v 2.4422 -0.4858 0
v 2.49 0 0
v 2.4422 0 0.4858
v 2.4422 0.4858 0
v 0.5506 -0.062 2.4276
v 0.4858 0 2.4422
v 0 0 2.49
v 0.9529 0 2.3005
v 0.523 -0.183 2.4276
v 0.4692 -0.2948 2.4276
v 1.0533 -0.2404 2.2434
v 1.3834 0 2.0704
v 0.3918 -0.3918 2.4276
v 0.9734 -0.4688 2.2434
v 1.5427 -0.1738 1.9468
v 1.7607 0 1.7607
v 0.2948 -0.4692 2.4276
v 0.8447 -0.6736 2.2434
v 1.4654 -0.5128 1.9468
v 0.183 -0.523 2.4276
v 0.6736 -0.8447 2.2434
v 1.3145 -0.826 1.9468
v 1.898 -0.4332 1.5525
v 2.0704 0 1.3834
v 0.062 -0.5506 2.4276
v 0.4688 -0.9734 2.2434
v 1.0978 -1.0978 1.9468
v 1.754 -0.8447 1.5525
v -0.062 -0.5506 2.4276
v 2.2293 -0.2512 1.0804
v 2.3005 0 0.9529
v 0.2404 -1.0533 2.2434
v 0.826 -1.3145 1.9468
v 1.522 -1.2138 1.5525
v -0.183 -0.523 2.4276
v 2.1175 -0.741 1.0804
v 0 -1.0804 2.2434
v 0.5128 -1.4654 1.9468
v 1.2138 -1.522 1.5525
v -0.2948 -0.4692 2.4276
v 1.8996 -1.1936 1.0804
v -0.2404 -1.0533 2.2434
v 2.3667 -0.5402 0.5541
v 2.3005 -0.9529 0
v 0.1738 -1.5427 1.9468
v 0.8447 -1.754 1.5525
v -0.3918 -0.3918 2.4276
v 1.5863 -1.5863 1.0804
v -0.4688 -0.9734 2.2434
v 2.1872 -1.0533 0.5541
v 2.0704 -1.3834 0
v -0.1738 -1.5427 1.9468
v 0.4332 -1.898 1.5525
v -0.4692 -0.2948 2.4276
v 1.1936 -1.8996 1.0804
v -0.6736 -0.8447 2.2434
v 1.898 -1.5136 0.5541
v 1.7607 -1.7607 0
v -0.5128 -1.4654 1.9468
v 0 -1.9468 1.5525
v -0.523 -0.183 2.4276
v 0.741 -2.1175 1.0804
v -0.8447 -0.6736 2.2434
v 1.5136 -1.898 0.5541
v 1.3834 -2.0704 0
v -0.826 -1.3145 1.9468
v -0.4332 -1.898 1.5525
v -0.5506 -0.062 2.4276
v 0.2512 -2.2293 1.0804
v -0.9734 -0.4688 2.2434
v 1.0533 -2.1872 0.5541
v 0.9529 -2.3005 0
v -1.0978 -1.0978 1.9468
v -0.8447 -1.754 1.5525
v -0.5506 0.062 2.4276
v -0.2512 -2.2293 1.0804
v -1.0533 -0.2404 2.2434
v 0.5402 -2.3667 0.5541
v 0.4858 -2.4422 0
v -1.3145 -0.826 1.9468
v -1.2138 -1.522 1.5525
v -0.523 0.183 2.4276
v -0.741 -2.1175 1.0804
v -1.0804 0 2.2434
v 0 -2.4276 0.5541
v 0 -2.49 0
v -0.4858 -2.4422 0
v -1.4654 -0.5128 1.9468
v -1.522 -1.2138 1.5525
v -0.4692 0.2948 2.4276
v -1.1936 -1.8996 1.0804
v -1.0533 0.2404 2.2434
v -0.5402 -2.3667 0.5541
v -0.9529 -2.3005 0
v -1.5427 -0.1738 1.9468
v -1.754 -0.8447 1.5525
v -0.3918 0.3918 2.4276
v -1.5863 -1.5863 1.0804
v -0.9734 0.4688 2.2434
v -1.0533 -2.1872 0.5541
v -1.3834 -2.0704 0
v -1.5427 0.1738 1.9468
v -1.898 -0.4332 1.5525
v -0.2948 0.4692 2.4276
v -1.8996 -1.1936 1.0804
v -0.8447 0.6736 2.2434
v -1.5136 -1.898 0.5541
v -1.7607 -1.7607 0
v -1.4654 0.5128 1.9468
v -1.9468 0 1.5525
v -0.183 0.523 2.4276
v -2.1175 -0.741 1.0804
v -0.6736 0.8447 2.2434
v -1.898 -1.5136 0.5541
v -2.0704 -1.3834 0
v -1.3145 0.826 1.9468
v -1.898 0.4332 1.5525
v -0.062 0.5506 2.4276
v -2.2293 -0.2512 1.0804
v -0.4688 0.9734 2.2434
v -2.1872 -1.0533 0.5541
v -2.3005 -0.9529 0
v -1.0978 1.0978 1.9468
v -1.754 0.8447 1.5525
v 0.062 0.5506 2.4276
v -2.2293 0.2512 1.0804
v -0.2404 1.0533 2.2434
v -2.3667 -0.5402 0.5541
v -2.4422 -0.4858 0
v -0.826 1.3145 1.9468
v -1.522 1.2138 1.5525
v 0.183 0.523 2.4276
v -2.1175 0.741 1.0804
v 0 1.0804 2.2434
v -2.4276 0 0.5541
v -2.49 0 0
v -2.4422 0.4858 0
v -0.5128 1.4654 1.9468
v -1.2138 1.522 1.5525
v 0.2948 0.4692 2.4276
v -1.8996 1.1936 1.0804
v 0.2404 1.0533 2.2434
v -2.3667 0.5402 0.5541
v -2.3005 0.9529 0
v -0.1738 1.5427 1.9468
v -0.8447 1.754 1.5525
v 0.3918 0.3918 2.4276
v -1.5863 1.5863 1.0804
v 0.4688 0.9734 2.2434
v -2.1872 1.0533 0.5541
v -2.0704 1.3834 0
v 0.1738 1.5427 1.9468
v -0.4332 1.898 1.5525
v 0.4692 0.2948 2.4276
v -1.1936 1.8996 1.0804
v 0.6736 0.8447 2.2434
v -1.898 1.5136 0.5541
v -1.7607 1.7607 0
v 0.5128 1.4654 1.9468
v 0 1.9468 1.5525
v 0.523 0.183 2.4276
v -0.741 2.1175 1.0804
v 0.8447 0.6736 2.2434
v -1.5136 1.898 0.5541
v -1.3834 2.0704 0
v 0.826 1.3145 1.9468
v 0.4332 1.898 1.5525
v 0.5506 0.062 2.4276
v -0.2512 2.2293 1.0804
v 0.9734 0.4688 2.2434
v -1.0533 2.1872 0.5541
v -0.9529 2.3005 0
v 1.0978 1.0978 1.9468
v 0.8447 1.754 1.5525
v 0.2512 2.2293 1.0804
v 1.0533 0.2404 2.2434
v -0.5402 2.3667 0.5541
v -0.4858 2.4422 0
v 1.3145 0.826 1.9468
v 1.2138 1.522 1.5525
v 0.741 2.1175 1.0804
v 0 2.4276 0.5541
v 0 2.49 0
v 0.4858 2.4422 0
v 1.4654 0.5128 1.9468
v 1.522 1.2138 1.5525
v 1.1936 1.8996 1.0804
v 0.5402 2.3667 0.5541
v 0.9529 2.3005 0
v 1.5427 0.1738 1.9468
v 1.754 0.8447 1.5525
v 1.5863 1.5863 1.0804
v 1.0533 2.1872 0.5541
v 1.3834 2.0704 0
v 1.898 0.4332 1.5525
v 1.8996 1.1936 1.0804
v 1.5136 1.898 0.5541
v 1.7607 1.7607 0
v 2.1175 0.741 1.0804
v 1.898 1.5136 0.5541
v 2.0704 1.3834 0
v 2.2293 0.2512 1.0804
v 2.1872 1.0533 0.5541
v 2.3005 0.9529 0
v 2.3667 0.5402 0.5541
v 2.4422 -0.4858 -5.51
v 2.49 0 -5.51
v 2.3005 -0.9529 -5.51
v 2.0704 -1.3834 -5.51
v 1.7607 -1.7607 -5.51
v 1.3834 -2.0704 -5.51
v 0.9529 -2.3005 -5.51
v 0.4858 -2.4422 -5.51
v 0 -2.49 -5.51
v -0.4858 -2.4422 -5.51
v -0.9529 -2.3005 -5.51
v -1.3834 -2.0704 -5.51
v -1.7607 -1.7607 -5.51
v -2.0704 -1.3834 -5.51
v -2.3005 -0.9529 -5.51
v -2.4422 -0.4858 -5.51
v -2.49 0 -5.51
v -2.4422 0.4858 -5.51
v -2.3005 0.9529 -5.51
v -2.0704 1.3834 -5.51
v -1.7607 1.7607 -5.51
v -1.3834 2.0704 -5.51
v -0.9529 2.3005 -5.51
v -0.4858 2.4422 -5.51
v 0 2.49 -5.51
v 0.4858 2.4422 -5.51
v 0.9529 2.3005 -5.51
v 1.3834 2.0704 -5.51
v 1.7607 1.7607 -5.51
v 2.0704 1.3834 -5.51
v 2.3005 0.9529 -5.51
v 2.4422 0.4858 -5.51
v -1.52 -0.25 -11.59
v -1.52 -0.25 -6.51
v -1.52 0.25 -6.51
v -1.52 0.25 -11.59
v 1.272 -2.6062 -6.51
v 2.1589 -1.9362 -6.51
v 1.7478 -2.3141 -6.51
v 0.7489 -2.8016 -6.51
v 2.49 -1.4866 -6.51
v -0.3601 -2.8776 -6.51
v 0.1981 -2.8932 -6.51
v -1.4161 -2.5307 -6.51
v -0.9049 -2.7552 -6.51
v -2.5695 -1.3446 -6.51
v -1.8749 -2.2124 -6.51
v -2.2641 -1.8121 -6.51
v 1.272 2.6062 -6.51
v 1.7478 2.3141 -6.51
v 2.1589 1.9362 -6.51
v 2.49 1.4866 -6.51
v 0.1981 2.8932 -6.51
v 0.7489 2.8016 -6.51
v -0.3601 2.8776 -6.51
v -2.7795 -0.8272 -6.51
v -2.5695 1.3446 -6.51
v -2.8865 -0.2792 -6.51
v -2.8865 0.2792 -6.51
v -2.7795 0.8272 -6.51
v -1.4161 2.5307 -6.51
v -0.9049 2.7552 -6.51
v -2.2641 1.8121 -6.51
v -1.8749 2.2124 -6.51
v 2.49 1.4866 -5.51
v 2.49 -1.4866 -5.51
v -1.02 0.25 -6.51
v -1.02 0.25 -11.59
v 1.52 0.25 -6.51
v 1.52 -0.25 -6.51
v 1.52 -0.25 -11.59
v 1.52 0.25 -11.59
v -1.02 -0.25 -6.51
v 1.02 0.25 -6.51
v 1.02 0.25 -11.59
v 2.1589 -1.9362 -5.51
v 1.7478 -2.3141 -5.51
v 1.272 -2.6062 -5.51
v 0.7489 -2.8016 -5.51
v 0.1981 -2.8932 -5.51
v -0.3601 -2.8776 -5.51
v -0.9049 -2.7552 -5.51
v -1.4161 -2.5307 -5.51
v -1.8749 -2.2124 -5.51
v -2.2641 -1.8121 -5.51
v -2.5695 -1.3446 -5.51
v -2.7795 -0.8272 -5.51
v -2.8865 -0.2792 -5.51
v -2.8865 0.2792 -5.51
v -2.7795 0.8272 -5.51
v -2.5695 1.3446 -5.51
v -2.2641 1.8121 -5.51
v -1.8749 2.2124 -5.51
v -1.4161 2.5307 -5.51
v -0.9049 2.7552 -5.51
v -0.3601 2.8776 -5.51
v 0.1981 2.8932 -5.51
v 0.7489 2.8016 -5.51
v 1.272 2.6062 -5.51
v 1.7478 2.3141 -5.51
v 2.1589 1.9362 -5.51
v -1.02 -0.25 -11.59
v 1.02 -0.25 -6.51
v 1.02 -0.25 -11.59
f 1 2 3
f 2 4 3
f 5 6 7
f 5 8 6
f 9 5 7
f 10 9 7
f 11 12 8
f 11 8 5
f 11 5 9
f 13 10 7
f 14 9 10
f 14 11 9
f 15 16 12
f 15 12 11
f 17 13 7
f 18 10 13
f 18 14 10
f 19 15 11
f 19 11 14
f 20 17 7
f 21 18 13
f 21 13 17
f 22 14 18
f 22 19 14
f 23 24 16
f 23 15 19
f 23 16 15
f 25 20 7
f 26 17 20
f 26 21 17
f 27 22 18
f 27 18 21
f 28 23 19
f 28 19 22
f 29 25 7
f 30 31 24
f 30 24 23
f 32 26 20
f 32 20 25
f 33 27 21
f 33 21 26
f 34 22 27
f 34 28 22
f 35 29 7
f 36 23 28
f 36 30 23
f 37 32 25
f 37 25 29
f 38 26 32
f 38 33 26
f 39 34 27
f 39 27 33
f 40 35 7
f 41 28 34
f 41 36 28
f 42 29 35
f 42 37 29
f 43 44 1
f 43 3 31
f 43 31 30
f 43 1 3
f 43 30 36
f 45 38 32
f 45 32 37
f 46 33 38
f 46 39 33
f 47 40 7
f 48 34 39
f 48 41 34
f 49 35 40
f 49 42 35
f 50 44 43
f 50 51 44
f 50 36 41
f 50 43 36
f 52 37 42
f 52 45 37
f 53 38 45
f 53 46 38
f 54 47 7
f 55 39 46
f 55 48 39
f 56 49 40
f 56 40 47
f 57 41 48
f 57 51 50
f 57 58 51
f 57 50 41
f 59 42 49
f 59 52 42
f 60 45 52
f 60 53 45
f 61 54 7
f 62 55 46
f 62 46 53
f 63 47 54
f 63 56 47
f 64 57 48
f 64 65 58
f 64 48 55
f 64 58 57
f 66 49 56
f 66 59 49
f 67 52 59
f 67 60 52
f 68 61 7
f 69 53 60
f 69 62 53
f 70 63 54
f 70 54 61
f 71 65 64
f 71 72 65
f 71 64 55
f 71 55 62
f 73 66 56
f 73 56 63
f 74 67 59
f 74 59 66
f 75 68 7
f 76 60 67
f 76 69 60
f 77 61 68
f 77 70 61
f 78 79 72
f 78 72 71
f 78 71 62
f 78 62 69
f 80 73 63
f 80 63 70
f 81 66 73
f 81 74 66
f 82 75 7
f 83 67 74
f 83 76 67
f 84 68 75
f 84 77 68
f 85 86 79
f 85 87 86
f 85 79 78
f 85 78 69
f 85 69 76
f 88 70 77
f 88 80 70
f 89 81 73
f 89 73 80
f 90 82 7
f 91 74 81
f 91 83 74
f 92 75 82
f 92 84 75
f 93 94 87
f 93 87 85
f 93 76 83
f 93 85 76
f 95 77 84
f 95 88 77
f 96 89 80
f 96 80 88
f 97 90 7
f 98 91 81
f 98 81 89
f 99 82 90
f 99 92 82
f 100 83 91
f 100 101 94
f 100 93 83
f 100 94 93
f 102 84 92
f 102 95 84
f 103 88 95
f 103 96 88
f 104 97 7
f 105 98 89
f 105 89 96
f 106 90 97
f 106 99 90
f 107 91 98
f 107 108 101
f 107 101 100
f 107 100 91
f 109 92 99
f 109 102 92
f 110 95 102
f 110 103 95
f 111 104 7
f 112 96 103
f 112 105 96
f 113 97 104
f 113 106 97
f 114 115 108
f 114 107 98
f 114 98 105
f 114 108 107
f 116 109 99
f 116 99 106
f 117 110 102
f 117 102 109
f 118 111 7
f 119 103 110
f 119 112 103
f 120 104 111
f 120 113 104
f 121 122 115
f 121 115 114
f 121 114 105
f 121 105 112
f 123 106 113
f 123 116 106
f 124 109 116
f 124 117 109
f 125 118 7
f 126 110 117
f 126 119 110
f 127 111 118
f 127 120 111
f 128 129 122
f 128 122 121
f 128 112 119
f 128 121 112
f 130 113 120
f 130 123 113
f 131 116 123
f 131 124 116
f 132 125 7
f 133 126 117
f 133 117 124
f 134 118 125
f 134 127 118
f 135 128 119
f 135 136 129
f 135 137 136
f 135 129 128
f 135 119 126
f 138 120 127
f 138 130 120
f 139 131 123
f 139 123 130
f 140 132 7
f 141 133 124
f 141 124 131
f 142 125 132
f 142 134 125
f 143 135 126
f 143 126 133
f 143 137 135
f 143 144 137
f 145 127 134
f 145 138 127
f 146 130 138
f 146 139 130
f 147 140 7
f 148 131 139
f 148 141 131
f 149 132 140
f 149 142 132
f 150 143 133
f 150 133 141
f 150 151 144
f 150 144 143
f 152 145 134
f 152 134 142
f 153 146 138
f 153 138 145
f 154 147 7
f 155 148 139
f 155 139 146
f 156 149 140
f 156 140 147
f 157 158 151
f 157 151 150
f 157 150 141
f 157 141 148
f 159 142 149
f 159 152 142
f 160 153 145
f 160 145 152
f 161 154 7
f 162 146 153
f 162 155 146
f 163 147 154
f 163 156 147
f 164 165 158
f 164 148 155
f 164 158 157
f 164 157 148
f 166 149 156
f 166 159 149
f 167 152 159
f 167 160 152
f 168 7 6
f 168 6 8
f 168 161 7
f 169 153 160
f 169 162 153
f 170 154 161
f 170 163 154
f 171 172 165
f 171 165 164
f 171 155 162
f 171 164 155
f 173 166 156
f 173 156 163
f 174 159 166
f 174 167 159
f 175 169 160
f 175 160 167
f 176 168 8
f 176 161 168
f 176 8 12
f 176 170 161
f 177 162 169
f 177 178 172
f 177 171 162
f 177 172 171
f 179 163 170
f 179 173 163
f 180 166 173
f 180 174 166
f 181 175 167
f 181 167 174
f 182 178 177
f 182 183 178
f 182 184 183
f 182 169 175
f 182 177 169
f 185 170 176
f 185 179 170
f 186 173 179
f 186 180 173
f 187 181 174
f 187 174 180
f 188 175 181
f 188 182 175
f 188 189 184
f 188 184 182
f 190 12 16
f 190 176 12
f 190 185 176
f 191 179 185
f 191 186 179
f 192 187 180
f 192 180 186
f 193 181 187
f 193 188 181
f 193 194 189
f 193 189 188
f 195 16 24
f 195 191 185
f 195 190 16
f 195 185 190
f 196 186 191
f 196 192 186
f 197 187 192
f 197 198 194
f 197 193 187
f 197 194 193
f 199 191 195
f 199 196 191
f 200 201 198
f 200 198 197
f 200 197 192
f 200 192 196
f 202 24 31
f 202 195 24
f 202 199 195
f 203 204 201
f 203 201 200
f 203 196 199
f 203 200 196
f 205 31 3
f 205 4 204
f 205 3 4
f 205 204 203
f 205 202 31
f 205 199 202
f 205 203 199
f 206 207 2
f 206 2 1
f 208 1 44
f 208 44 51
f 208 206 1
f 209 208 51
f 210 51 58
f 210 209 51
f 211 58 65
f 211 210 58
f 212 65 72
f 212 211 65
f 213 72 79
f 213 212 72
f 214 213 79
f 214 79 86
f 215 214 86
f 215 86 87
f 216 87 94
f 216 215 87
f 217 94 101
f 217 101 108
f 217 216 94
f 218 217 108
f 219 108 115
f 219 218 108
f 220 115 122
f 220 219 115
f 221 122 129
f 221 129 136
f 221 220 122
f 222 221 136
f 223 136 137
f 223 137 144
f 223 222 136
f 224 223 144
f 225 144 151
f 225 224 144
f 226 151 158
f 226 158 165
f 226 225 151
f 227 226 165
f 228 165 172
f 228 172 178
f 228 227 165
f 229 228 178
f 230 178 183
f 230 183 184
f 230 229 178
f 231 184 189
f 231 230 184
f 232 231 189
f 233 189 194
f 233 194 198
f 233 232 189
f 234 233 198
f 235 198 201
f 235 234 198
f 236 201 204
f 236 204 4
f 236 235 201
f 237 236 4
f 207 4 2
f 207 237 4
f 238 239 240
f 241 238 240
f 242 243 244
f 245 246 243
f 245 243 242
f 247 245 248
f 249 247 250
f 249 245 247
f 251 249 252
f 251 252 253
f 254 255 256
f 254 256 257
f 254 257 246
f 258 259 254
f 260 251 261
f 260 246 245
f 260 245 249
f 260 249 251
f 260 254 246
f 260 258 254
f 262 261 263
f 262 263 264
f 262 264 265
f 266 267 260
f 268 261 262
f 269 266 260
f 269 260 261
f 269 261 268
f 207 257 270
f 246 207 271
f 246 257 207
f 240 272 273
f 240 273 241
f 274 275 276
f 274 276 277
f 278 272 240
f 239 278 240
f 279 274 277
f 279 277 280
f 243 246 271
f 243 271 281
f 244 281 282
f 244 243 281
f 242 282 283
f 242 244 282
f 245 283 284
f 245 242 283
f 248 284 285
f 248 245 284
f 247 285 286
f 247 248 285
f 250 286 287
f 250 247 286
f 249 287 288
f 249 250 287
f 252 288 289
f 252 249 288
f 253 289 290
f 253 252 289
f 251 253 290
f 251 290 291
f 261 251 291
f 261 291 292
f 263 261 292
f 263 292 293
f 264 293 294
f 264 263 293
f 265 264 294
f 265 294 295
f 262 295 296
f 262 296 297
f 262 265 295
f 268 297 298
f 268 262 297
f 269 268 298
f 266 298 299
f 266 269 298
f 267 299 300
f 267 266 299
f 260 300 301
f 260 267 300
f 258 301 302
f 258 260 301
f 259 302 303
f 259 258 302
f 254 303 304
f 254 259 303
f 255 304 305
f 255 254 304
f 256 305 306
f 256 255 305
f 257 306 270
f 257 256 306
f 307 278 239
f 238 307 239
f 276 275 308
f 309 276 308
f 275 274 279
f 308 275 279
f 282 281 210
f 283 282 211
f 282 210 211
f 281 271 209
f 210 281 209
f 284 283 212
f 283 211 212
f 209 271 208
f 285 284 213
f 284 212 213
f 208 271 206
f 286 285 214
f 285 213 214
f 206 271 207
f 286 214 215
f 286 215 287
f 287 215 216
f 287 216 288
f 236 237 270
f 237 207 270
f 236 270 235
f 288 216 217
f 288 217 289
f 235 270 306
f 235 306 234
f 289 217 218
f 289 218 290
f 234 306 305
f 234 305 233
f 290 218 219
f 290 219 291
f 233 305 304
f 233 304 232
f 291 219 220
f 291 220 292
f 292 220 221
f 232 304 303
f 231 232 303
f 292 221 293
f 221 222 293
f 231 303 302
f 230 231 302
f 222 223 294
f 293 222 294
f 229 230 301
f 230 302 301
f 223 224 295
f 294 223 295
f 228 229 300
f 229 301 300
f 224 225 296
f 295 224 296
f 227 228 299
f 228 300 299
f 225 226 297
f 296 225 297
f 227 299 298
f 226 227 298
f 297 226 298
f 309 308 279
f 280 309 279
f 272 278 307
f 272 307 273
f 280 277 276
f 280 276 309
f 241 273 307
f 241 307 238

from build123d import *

# Parameters (mm, degrees)
BOSS_EXTRUDE1_DEPTH   = 1
SKETCH3_W             = 0.5
SKETCH3_H             = 0.5
BOSS_EXTRUDE2_DEPTH   = 5.08
BOSS_EXTRUDE2_2_DEPTH = 5.08


with BuildPart() as part:
    # Sketch1 → Revolve1 (revolve)
    with BuildSketch(Plane(origin=(0, 0, 0), x_dir=(1, 0, 0), z_dir=(0, 1, 0)), mode=Mode.PRIVATE) as revolve1_sk:
        with BuildLine():
            Line((-2.49, 0), (-2.49, 6.51))
            Line((-2.49, 6.51), (0, 6.51))
            Line((0, 6.51), (0, -2.49))
            ThreePointArc((0, -2.49), (-1.760695885, -1.760695885), (-2.49, 0))
        make_face()
    revolve(revolve1_sk.sketch.rotate(Axis((0, 0, 2.49), (0, 0, -1)), 180), axis=Axis((0, 0, 2.49), (0, 0, -1)))  # turned: the seam where the file's is

    # Sketch2 → Boss-Extrude1 (add)
    with BuildSketch(Plane(origin=(0, 0, -6.51), x_dir=(-1, 0, 0), z_dir=(0, 0, -1))):
        with BuildLine():
            Line((-2.49, 1.486573241), (-2.49, -1.486573241))
            ThreePointArc((-2.49, -1.486573241), (2.9, 0), (-2.49, 1.486573241))
        make_face()
    extrude(amount=-BOSS_EXTRUDE1_DEPTH)


with BuildPart() as body_2:
    # Sketch3 → Boss-Extrude2 (new body)
    with BuildSketch(Plane(origin=(0, 0, -6.51), x_dir=(-1, 0, 0), z_dir=(0, 0, -1))):
        with Locations((-1.27, 0)):
            Rectangle(SKETCH3_W, SKETCH3_H)
    extrude(amount=BOSS_EXTRUDE2_DEPTH)


with BuildPart() as body_3:
    # Sketch3 → Boss-Extrude2 2 (new body)
    with BuildSketch(Plane(origin=(0, 0, -6.51), x_dir=(-1, 0, 0), z_dir=(0, 0, -1))):
        with Locations((1.27, 0)):
            Rectangle(SKETCH3_W, SKETCH3_H)
    extrude(amount=BOSS_EXTRUDE2_2_DEPTH)


solid = Compound([part.part, body_2.part, body_3.part])
